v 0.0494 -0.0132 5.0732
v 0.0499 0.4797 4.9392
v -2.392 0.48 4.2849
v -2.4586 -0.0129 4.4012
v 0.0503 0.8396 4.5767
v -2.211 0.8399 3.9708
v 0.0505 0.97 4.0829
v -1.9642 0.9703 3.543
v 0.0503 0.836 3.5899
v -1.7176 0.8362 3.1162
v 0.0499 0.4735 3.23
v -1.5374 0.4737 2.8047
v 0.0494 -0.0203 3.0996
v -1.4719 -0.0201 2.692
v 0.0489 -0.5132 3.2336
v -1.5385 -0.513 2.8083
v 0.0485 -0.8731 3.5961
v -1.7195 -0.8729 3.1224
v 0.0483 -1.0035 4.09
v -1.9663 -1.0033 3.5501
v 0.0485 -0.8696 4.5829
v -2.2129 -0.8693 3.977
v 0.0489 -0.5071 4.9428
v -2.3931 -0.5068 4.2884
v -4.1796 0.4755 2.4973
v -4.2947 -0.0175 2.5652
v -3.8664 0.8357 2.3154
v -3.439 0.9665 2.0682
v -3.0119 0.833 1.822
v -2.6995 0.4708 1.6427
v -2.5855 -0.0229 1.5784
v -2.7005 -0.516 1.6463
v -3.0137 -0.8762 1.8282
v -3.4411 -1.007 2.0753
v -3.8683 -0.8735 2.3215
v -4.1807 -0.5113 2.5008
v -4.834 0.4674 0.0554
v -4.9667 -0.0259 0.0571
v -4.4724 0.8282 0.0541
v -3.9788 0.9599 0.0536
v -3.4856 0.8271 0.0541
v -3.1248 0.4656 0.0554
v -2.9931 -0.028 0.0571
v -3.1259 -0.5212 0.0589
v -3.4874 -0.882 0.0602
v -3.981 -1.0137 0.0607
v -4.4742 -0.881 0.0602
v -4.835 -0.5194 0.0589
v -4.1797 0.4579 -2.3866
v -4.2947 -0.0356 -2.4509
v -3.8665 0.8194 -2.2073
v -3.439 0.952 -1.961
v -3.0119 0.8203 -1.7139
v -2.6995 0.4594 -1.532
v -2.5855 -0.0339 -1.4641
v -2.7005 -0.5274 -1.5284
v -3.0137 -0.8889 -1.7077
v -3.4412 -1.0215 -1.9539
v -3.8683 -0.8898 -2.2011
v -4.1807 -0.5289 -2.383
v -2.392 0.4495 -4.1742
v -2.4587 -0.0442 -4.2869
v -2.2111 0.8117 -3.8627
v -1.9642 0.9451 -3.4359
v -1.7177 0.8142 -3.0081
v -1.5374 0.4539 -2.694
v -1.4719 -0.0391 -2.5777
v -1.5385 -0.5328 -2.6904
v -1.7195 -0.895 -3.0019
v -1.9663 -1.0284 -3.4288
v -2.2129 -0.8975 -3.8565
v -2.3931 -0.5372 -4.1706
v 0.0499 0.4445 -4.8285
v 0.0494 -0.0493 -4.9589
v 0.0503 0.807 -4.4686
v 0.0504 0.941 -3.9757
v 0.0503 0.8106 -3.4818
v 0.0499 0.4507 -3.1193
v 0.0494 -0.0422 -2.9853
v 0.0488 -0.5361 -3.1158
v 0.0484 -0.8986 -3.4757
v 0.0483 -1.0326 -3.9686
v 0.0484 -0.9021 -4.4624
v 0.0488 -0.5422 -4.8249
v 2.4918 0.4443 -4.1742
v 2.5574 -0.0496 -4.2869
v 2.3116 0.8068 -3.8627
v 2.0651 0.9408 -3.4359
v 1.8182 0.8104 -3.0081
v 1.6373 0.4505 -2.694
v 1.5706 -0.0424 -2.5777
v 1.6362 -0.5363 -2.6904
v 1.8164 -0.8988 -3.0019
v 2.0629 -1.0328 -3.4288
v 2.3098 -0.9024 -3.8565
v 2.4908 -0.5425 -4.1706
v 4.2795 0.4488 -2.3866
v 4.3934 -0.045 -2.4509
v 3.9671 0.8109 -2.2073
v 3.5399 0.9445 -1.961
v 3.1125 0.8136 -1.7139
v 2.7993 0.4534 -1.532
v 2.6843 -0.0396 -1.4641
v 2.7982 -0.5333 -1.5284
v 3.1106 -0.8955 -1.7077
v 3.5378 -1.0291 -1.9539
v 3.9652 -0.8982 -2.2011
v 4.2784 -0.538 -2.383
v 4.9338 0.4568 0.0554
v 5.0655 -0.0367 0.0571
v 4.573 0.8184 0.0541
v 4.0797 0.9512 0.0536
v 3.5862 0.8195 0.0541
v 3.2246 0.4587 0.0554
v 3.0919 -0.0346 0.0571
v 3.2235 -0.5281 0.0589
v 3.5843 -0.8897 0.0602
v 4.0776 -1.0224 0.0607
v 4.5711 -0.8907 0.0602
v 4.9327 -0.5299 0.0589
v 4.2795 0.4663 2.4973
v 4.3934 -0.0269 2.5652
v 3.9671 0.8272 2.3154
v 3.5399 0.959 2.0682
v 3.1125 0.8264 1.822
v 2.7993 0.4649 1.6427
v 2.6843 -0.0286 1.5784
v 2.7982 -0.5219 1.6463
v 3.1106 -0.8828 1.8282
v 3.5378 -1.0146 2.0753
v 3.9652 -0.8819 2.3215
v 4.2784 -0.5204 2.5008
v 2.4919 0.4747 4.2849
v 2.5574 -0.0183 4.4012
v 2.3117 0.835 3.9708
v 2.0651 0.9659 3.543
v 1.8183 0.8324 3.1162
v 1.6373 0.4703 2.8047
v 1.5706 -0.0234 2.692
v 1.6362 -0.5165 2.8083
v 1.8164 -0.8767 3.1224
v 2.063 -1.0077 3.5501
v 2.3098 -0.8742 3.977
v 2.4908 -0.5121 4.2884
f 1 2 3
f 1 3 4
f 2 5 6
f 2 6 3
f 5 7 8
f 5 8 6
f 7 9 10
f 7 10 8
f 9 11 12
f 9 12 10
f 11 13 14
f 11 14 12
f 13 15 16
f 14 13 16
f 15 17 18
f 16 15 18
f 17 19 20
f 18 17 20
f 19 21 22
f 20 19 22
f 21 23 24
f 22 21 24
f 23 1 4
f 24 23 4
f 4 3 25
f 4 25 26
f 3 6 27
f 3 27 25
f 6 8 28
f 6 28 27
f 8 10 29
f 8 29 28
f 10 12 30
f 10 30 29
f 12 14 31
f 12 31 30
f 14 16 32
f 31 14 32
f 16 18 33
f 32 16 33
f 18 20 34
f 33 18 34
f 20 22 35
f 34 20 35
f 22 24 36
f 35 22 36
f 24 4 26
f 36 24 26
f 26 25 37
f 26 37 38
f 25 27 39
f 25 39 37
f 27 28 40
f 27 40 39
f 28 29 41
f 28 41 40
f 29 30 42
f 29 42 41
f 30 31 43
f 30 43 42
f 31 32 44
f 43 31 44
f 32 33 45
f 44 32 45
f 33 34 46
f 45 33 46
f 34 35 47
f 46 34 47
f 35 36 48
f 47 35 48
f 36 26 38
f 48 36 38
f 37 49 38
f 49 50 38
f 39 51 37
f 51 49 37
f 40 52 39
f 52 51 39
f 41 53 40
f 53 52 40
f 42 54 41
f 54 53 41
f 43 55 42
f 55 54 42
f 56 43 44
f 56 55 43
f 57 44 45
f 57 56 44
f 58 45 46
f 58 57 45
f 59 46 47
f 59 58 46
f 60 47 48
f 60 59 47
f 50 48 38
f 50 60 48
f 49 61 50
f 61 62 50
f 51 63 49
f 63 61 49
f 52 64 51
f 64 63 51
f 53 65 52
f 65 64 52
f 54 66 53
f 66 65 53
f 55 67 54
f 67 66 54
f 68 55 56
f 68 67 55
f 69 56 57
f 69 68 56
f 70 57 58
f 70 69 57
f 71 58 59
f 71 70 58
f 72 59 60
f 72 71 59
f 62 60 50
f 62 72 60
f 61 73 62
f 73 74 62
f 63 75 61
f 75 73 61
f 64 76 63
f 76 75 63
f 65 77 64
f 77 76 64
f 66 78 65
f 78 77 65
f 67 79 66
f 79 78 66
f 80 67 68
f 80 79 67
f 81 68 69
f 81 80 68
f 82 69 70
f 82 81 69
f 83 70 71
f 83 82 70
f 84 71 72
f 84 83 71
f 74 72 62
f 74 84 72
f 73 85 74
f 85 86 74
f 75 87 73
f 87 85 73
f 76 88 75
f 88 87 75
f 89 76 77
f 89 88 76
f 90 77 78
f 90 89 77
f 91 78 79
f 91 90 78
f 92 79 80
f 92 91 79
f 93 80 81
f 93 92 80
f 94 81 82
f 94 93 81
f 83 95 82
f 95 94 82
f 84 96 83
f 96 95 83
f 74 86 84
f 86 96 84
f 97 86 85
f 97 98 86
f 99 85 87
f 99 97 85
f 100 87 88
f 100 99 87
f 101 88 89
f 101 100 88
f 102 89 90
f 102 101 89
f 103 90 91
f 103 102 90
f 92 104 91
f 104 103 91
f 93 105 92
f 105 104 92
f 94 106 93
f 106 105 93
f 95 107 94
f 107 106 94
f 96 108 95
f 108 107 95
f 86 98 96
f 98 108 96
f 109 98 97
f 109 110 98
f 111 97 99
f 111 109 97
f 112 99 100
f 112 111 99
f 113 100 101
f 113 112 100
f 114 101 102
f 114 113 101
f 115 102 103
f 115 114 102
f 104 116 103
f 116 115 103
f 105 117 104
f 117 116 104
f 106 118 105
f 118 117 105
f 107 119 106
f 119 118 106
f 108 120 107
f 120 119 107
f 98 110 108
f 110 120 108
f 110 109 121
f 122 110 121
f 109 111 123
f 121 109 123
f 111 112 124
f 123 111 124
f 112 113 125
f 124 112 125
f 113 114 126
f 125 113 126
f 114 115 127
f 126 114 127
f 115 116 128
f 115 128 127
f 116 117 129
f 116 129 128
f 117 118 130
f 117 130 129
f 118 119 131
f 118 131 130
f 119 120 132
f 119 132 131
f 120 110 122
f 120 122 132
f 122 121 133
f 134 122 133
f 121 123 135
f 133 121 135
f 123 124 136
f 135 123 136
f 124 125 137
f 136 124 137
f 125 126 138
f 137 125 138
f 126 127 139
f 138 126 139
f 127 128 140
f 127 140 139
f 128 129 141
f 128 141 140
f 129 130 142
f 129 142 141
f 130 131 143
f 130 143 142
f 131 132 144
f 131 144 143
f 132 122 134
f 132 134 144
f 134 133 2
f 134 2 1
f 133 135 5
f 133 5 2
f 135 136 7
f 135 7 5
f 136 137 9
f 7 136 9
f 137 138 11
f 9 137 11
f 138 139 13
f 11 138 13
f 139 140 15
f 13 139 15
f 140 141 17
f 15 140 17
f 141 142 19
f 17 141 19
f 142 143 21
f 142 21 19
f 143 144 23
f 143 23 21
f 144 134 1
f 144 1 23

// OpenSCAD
// Begin.
union() {
translate([0.04938, -0.03127, 0.05714])
rotate([0, 0.206265, 89.9381])
rotate([0, 90, 0])
rotate_extrude($fn = 12)
translate([4.02929, 0, 0])
circle(r = 0.98679, $fn = 12);

translate([0.04938, -0.03127, 0.05714])
rotate([0, 0.206265, 89.9381])
rotate([0, 90, 0])
rotate_extrude($fn = 12)
translate([4.02929, 0, 0])
circle(r = 0.98679, $fn = 12);
}
// End.
